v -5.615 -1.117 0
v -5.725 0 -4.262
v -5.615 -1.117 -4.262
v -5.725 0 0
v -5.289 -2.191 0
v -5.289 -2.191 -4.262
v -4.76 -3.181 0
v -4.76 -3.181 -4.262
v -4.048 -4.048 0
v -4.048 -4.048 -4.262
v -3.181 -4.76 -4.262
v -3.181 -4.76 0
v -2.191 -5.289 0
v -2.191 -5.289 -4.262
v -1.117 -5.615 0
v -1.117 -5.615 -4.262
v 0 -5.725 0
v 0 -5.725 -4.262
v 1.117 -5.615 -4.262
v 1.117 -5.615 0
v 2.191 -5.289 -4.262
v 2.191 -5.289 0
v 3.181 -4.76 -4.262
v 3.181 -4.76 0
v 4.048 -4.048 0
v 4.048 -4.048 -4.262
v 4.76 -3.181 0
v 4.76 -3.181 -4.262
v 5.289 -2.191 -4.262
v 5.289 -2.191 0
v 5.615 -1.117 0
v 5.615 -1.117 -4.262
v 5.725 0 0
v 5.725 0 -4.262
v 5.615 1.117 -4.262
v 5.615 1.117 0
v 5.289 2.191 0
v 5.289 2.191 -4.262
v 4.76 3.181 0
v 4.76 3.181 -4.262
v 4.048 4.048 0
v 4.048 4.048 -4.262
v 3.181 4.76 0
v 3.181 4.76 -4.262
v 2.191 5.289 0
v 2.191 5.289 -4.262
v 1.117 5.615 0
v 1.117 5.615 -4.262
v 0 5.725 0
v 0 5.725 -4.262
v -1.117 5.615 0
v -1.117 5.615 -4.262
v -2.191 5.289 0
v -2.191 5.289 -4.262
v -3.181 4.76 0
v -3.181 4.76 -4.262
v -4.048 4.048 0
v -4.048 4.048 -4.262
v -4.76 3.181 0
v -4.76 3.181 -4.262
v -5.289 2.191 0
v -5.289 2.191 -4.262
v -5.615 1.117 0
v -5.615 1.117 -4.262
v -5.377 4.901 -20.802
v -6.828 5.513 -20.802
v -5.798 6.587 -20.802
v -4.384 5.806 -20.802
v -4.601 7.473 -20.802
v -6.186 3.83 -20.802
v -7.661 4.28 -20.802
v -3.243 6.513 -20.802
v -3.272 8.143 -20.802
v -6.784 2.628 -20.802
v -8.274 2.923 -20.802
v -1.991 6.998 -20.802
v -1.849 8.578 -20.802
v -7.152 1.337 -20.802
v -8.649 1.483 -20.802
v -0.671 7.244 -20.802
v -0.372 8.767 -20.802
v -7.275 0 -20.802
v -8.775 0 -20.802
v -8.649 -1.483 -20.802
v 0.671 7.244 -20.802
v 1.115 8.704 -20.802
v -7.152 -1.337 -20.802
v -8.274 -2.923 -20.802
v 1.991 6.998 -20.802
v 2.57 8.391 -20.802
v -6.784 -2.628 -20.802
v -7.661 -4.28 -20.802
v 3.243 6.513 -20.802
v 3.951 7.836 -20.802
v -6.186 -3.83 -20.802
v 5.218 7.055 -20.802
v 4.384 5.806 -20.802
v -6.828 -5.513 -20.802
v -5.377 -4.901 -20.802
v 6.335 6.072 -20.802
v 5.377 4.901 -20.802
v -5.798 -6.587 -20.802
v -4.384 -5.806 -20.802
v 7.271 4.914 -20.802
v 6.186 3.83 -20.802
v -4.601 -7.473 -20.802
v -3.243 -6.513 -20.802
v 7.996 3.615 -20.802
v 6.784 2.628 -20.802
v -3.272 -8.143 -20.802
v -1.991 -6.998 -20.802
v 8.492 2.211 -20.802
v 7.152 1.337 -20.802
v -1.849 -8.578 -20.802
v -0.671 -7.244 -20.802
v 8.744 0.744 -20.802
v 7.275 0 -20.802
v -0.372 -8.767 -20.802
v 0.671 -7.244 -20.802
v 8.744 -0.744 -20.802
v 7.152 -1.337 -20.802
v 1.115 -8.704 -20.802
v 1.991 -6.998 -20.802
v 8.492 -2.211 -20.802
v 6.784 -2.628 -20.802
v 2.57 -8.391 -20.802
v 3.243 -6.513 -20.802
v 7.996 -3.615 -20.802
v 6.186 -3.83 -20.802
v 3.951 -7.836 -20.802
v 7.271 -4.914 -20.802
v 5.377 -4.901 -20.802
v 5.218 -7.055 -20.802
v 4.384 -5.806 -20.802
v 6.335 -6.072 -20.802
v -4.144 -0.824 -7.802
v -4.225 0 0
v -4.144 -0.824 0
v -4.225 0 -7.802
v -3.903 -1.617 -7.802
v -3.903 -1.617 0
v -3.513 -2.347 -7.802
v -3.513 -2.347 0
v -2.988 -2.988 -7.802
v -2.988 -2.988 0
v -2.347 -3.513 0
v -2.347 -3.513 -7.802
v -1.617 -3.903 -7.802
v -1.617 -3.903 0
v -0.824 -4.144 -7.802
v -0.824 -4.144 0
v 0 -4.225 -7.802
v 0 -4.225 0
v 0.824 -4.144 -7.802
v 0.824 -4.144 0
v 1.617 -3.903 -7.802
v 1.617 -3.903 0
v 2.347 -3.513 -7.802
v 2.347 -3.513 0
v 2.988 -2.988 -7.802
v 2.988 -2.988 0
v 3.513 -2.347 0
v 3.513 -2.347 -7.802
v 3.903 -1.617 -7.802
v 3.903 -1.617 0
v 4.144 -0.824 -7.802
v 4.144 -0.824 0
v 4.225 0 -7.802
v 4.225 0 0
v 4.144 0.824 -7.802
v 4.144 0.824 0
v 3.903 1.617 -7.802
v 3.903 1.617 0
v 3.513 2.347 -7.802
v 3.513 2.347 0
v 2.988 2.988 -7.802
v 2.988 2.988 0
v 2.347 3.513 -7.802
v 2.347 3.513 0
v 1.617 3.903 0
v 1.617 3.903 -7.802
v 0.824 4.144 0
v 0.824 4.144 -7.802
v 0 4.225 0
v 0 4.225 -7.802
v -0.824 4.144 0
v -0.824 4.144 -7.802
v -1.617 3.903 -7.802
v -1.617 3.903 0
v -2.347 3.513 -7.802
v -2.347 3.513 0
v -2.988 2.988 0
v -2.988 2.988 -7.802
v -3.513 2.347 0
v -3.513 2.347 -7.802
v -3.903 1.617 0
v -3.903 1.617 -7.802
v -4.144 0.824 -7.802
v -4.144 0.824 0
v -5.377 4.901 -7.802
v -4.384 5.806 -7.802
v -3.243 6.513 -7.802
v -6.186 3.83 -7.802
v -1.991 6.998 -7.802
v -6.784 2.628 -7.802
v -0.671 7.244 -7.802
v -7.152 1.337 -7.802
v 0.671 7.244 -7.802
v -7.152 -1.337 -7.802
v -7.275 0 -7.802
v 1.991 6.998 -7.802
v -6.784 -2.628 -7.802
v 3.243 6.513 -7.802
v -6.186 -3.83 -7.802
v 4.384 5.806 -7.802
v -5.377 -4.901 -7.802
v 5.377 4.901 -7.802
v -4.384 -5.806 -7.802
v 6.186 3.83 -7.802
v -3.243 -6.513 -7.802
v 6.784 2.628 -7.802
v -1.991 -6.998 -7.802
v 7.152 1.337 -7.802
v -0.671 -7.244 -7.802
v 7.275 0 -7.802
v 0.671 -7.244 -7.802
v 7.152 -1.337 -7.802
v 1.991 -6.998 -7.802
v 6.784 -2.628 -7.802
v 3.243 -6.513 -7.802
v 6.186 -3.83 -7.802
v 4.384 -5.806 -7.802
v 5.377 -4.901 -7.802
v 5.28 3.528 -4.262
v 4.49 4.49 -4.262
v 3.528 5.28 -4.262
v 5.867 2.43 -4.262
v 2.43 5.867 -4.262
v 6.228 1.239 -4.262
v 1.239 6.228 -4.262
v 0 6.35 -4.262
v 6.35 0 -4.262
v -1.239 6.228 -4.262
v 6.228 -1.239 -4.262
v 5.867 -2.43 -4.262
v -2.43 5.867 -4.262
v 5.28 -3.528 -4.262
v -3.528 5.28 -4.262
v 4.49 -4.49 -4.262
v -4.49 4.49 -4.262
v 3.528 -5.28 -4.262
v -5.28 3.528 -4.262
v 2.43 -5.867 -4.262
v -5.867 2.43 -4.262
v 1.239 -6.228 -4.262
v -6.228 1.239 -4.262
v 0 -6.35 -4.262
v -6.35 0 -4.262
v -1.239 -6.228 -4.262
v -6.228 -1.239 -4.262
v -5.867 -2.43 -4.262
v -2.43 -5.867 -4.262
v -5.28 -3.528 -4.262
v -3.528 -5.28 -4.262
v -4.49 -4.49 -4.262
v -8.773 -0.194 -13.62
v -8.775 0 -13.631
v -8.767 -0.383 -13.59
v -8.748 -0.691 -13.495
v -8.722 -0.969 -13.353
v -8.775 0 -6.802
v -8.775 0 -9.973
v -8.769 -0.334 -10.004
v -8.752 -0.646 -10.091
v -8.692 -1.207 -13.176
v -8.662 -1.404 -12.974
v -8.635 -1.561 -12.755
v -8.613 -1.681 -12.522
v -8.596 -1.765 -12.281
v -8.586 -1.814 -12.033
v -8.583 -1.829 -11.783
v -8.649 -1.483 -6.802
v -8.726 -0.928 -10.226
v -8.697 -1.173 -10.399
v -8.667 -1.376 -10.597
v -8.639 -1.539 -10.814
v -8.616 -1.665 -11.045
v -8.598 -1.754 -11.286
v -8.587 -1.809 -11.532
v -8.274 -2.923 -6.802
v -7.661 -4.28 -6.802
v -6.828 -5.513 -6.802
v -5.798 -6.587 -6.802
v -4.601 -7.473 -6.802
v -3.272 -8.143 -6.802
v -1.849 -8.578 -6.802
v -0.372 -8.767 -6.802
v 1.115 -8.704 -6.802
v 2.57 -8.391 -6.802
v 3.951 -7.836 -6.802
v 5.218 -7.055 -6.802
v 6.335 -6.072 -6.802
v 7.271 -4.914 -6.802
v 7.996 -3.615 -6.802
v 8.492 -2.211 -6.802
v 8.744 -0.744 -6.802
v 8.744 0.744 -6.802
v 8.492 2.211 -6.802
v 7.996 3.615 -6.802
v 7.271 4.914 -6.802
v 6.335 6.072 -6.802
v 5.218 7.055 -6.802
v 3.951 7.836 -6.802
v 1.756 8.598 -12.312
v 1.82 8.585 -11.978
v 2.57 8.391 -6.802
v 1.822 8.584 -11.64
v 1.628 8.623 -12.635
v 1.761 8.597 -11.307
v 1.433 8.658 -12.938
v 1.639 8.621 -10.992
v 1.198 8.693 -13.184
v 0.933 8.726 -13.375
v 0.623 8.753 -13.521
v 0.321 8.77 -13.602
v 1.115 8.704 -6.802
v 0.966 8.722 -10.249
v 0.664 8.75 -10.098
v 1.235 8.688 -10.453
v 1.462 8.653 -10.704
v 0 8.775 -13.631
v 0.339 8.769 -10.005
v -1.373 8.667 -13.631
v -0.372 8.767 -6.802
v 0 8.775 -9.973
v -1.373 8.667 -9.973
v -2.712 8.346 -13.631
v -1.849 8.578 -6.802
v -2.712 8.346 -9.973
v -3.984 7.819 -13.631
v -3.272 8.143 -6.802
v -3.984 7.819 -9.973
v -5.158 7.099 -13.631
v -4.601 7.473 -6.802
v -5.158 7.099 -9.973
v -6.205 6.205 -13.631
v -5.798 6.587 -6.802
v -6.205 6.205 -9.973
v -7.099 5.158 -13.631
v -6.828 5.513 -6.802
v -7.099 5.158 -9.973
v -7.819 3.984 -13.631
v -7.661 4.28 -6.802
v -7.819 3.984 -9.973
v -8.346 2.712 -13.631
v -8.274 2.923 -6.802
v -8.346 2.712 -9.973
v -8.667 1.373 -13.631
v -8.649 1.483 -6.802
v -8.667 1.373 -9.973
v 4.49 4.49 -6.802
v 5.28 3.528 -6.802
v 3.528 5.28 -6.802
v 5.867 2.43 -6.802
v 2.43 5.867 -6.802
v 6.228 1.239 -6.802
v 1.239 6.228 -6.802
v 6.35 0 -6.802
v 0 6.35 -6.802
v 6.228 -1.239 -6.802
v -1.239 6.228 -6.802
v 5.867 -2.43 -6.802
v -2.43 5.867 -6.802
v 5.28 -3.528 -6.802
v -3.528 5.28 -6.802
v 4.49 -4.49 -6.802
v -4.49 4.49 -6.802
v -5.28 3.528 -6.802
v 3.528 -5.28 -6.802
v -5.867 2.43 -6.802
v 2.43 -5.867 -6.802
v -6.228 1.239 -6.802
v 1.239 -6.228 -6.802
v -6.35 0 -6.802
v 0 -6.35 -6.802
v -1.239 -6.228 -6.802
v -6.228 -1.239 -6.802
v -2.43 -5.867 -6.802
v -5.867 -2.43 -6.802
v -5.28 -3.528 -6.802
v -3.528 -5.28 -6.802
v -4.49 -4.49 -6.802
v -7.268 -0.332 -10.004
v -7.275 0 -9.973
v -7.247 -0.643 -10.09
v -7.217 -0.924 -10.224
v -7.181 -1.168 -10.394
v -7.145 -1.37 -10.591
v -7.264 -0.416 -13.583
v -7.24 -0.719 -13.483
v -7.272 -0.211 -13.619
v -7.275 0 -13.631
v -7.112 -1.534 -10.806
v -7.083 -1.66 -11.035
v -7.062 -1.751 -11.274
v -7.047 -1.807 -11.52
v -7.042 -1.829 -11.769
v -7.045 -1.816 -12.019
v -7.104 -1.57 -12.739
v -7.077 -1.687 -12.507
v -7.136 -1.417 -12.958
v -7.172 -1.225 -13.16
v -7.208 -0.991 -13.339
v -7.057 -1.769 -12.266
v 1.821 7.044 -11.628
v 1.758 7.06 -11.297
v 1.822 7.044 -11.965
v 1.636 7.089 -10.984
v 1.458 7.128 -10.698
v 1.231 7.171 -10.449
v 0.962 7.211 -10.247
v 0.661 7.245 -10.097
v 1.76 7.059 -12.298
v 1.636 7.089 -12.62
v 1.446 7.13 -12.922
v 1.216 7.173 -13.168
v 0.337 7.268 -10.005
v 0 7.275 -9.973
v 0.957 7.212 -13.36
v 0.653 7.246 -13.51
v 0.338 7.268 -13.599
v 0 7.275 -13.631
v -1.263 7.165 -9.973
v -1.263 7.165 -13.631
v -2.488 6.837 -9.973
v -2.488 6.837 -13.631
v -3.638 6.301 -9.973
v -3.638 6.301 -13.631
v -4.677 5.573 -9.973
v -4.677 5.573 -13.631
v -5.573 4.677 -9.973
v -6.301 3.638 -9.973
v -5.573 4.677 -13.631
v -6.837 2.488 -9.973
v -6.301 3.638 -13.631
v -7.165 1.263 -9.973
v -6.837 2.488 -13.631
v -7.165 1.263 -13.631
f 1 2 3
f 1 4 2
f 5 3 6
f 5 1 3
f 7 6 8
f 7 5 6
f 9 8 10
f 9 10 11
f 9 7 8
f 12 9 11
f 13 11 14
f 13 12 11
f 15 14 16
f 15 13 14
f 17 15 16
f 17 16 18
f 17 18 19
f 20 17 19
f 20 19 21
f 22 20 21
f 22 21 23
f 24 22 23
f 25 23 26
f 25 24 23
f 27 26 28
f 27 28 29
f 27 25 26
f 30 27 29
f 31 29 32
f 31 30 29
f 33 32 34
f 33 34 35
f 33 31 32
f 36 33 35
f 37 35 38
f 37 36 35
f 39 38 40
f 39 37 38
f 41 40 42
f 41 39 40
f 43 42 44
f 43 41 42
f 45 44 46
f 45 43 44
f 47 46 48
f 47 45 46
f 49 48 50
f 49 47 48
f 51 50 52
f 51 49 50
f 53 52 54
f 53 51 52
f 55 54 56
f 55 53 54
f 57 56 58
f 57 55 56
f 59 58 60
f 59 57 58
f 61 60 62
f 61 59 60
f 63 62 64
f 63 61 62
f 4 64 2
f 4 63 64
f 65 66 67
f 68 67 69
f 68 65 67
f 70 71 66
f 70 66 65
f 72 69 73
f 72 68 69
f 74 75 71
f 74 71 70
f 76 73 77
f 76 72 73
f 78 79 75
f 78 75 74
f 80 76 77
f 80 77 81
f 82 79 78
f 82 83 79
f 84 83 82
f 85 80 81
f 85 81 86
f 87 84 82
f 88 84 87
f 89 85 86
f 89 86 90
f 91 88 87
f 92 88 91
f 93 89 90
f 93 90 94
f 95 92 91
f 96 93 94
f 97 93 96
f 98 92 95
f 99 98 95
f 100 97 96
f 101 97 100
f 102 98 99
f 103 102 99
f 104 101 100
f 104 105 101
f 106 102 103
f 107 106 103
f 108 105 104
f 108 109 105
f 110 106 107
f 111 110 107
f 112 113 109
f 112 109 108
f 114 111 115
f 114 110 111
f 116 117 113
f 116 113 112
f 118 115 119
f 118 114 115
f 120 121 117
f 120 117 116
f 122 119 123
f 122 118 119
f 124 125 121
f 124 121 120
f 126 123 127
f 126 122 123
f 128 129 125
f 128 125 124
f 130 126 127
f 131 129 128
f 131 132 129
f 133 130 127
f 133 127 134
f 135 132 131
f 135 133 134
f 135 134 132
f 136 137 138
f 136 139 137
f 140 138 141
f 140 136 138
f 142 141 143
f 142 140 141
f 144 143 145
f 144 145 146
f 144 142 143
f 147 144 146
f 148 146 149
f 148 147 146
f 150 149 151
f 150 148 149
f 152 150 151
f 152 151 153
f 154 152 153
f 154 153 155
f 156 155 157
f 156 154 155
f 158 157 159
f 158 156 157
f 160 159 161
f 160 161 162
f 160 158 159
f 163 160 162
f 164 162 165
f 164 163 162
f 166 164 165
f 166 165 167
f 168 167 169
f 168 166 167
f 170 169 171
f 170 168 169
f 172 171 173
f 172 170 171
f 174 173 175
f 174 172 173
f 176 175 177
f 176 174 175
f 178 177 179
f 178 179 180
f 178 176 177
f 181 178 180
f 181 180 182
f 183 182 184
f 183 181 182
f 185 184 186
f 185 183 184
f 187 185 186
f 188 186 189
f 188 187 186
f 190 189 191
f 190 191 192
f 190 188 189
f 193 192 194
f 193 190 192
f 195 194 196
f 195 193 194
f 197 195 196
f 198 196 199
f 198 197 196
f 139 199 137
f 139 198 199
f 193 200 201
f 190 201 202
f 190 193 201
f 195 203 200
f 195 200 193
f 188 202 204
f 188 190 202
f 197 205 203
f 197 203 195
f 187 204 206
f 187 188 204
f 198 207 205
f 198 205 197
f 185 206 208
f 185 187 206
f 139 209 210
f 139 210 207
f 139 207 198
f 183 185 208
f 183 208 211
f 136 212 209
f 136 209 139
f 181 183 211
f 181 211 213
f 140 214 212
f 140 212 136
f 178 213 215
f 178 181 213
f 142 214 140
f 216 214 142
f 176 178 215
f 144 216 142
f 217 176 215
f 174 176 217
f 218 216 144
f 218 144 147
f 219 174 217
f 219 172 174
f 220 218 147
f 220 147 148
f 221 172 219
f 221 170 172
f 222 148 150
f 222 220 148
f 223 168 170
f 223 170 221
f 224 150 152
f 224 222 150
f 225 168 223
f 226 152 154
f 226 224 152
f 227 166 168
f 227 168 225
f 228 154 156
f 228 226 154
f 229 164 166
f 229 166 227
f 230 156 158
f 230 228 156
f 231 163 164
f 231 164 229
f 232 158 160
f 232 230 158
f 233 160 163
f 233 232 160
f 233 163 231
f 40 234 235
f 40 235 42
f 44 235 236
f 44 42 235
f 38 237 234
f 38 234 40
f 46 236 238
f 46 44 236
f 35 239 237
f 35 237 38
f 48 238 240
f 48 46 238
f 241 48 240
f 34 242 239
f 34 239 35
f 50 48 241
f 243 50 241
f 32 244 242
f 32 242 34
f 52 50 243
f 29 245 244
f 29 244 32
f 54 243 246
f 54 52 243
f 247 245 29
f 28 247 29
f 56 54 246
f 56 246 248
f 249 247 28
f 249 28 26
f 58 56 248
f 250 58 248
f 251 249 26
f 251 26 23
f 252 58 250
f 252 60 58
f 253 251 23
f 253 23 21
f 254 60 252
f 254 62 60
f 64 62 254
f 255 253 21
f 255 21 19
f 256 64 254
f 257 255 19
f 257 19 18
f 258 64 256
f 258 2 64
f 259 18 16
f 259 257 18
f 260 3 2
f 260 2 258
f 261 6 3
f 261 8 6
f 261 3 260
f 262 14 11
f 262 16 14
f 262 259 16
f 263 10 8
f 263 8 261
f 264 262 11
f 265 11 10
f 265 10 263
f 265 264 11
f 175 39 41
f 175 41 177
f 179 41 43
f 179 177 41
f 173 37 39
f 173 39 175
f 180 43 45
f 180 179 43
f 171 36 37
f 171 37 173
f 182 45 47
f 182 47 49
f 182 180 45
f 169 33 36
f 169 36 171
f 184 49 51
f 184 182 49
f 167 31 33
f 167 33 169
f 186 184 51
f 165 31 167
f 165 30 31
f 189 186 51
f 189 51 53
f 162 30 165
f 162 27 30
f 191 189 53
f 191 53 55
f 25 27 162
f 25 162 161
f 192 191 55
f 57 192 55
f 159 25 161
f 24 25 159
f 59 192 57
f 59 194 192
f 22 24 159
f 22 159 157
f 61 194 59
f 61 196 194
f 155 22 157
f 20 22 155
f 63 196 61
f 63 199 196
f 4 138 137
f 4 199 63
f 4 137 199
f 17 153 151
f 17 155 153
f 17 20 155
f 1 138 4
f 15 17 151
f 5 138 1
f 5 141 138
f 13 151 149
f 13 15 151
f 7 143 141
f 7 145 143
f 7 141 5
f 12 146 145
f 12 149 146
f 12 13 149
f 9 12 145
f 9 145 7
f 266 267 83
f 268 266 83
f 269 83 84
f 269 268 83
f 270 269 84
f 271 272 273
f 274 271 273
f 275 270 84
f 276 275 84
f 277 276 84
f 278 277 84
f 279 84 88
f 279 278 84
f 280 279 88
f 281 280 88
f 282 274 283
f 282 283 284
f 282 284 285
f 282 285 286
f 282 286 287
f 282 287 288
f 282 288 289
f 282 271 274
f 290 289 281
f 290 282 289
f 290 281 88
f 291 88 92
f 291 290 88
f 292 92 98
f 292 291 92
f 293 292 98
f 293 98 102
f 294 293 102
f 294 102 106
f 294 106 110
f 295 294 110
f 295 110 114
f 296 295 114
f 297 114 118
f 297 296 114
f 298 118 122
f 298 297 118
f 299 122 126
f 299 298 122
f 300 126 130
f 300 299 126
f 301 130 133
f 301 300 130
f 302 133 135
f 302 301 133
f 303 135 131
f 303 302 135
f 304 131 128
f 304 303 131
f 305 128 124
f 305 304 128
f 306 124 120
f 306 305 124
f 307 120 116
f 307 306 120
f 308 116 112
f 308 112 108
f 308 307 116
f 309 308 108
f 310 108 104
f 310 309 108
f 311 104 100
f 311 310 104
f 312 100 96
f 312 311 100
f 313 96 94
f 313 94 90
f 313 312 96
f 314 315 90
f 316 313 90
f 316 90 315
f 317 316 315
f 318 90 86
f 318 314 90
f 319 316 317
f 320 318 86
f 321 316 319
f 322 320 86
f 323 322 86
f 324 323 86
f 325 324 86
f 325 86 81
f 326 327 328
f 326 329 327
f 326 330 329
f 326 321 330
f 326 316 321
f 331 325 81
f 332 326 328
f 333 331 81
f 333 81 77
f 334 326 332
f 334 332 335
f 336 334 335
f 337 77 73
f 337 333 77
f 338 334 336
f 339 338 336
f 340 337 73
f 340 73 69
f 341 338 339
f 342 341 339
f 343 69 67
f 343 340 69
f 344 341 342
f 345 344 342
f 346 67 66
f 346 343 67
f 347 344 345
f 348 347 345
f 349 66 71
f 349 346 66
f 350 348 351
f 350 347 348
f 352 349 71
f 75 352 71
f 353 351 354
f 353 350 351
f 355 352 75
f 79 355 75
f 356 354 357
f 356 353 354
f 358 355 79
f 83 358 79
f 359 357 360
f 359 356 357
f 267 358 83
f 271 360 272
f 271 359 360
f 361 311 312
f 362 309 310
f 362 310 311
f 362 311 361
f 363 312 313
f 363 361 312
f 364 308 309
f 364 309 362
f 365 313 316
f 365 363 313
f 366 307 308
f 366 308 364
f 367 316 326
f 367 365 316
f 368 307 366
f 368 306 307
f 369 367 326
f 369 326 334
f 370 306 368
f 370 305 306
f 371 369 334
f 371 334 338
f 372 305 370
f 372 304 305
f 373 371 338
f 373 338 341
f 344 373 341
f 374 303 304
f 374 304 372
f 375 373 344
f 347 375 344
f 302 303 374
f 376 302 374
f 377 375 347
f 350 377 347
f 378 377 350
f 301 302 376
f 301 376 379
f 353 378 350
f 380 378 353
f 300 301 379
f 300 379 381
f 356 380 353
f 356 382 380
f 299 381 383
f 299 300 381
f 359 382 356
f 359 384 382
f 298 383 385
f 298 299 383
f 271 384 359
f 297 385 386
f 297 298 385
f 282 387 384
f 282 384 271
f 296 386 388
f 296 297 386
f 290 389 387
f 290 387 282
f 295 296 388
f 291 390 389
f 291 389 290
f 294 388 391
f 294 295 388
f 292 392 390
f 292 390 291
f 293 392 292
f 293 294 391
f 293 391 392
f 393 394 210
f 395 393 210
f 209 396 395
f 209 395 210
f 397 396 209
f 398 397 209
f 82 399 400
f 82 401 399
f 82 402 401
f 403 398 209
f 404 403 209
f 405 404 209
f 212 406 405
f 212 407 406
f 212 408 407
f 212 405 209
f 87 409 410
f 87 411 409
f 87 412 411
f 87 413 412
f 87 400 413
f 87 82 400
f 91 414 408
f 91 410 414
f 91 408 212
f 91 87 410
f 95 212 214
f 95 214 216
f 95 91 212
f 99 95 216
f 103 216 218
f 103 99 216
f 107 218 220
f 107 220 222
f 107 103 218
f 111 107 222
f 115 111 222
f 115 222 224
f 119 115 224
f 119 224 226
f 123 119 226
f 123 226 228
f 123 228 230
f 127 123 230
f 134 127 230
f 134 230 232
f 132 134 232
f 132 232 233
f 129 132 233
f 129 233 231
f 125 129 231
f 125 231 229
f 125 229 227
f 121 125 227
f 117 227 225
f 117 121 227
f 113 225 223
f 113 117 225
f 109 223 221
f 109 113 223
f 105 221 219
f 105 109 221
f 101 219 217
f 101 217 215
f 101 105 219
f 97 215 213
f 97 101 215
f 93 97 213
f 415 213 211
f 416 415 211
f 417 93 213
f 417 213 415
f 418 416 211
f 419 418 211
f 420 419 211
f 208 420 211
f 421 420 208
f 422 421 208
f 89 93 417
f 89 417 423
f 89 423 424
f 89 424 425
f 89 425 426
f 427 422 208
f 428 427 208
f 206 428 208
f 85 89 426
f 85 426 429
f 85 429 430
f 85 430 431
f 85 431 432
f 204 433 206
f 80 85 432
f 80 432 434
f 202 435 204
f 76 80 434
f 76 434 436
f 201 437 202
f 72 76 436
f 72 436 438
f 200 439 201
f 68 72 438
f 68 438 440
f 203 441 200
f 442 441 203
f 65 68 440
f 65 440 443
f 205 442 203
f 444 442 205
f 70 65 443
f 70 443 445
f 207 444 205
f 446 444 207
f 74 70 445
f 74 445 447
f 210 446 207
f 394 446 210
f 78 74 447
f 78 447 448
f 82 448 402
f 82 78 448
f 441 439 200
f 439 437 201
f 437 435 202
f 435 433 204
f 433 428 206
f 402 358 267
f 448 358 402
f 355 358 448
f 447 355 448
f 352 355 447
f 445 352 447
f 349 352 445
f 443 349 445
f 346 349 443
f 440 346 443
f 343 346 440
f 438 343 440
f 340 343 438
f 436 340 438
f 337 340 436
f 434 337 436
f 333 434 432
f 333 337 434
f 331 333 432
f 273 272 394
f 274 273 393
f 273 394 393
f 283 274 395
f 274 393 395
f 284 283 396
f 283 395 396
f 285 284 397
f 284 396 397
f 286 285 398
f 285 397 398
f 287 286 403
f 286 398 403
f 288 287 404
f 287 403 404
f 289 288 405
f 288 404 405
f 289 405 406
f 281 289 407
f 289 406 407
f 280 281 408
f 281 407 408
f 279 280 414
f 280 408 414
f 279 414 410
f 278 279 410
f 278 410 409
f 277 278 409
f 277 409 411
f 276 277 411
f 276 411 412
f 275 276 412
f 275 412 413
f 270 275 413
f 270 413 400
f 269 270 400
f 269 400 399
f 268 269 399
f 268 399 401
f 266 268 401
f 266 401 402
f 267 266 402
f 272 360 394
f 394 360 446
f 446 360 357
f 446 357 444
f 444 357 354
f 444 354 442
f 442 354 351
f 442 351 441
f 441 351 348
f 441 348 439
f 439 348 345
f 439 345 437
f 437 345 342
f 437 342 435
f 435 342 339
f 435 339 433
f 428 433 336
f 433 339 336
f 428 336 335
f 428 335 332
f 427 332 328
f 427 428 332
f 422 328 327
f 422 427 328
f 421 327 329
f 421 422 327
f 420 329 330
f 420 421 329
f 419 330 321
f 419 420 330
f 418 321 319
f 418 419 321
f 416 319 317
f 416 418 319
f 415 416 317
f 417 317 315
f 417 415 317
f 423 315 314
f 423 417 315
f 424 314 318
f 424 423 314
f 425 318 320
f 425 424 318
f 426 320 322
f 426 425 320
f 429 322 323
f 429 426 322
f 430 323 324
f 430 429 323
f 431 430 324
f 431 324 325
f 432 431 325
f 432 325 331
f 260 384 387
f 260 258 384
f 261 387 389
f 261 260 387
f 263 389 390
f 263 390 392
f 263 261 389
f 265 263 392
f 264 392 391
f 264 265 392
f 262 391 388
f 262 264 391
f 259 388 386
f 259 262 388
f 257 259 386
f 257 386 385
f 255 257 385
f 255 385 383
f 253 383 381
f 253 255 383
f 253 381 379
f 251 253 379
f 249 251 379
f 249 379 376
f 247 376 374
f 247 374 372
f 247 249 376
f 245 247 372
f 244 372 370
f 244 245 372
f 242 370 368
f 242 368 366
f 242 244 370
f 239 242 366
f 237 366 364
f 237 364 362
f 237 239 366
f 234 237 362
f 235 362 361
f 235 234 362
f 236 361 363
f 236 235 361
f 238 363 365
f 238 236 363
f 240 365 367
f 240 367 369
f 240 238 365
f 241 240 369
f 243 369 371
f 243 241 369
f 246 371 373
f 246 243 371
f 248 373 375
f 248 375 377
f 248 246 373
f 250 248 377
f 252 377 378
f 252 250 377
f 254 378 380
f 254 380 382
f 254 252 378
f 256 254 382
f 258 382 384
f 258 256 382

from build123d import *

# Parameters (mm, degrees)
SKETCH2_R          = 1.8288
CUT_EXTRUDE1_DEPTH = 9.7754
SKETCH3_R          = 1.8288
CUT_EXTRUDE2_DEPTH = 9.7754001
CUT_EXTRUDE3_DEPTH = 3.6576


with BuildPart() as part:
    # Sketch1 → Revolve1 (revolve)
    with BuildSketch(Plane(origin=(0, 0, 0), x_dir=(0, 0, -1), z_dir=(1, 0, 0)), mode=Mode.PRIVATE) as revolve1_sk:
        Polygon((0, 5.725), (0, 4.225), (7.802, 4.225), (7.802, 7.2754), (20.802, 7.2754), (20.802, 8.7754), (6.802, 8.7754), (6.802, 6.35), (4.262, 6.35), (4.262, 5.725), align=None)
    revolve(revolve1_sk.sketch.rotate(Axis((0, 0, 0), (0, 0, 1)), 90), axis=Axis((0, 0, 0), (0, 0, 1)))  # turned: the seam where the file's is

    # Sketch2 → Cut-Extrude1 (cut, through all)
    with BuildSketch(Plane(origin=(0, 0, 0), x_dir=(1, 0, 0), z_dir=(0, 1, 0))):
        with Locations(Location((0, 11.802, 0), (0, 0, 90))):  # turned: the seam where the file's is
            Circle(SKETCH2_R)
    extrude(amount=CUT_EXTRUDE1_DEPTH, mode=Mode.SUBTRACT)

    # Sketch3 → Cut-Extrude2 (cut, through all)
    with BuildSketch(Plane(origin=(0, 0, 0), x_dir=(0, 0, -1), z_dir=(1, 0, 0))):
        with Locations((11.802, 0)):
            Circle(SKETCH3_R)
    extrude(amount=-CUT_EXTRUDE2_DEPTH, mode=Mode.SUBTRACT)

    # Sketch4 → Cut-Extrude3 (cut)
    with BuildSketch(Plane(origin=(0, 0, -9.9732), x_dir=(-1, 0, 0), z_dir=(0, 0, -1))):
        with BuildLine():
            Line((0, 0), (0, 8.7754))
            ThreePointArc((0, 8.7754), (6.205144848, 6.205144848), (8.7754, 0))
            Line((8.7754, 0), (0, 0))
        make_face()
    extrude(amount=CUT_EXTRUDE3_DEPTH, mode=Mode.SUBTRACT)


solid = part.part
